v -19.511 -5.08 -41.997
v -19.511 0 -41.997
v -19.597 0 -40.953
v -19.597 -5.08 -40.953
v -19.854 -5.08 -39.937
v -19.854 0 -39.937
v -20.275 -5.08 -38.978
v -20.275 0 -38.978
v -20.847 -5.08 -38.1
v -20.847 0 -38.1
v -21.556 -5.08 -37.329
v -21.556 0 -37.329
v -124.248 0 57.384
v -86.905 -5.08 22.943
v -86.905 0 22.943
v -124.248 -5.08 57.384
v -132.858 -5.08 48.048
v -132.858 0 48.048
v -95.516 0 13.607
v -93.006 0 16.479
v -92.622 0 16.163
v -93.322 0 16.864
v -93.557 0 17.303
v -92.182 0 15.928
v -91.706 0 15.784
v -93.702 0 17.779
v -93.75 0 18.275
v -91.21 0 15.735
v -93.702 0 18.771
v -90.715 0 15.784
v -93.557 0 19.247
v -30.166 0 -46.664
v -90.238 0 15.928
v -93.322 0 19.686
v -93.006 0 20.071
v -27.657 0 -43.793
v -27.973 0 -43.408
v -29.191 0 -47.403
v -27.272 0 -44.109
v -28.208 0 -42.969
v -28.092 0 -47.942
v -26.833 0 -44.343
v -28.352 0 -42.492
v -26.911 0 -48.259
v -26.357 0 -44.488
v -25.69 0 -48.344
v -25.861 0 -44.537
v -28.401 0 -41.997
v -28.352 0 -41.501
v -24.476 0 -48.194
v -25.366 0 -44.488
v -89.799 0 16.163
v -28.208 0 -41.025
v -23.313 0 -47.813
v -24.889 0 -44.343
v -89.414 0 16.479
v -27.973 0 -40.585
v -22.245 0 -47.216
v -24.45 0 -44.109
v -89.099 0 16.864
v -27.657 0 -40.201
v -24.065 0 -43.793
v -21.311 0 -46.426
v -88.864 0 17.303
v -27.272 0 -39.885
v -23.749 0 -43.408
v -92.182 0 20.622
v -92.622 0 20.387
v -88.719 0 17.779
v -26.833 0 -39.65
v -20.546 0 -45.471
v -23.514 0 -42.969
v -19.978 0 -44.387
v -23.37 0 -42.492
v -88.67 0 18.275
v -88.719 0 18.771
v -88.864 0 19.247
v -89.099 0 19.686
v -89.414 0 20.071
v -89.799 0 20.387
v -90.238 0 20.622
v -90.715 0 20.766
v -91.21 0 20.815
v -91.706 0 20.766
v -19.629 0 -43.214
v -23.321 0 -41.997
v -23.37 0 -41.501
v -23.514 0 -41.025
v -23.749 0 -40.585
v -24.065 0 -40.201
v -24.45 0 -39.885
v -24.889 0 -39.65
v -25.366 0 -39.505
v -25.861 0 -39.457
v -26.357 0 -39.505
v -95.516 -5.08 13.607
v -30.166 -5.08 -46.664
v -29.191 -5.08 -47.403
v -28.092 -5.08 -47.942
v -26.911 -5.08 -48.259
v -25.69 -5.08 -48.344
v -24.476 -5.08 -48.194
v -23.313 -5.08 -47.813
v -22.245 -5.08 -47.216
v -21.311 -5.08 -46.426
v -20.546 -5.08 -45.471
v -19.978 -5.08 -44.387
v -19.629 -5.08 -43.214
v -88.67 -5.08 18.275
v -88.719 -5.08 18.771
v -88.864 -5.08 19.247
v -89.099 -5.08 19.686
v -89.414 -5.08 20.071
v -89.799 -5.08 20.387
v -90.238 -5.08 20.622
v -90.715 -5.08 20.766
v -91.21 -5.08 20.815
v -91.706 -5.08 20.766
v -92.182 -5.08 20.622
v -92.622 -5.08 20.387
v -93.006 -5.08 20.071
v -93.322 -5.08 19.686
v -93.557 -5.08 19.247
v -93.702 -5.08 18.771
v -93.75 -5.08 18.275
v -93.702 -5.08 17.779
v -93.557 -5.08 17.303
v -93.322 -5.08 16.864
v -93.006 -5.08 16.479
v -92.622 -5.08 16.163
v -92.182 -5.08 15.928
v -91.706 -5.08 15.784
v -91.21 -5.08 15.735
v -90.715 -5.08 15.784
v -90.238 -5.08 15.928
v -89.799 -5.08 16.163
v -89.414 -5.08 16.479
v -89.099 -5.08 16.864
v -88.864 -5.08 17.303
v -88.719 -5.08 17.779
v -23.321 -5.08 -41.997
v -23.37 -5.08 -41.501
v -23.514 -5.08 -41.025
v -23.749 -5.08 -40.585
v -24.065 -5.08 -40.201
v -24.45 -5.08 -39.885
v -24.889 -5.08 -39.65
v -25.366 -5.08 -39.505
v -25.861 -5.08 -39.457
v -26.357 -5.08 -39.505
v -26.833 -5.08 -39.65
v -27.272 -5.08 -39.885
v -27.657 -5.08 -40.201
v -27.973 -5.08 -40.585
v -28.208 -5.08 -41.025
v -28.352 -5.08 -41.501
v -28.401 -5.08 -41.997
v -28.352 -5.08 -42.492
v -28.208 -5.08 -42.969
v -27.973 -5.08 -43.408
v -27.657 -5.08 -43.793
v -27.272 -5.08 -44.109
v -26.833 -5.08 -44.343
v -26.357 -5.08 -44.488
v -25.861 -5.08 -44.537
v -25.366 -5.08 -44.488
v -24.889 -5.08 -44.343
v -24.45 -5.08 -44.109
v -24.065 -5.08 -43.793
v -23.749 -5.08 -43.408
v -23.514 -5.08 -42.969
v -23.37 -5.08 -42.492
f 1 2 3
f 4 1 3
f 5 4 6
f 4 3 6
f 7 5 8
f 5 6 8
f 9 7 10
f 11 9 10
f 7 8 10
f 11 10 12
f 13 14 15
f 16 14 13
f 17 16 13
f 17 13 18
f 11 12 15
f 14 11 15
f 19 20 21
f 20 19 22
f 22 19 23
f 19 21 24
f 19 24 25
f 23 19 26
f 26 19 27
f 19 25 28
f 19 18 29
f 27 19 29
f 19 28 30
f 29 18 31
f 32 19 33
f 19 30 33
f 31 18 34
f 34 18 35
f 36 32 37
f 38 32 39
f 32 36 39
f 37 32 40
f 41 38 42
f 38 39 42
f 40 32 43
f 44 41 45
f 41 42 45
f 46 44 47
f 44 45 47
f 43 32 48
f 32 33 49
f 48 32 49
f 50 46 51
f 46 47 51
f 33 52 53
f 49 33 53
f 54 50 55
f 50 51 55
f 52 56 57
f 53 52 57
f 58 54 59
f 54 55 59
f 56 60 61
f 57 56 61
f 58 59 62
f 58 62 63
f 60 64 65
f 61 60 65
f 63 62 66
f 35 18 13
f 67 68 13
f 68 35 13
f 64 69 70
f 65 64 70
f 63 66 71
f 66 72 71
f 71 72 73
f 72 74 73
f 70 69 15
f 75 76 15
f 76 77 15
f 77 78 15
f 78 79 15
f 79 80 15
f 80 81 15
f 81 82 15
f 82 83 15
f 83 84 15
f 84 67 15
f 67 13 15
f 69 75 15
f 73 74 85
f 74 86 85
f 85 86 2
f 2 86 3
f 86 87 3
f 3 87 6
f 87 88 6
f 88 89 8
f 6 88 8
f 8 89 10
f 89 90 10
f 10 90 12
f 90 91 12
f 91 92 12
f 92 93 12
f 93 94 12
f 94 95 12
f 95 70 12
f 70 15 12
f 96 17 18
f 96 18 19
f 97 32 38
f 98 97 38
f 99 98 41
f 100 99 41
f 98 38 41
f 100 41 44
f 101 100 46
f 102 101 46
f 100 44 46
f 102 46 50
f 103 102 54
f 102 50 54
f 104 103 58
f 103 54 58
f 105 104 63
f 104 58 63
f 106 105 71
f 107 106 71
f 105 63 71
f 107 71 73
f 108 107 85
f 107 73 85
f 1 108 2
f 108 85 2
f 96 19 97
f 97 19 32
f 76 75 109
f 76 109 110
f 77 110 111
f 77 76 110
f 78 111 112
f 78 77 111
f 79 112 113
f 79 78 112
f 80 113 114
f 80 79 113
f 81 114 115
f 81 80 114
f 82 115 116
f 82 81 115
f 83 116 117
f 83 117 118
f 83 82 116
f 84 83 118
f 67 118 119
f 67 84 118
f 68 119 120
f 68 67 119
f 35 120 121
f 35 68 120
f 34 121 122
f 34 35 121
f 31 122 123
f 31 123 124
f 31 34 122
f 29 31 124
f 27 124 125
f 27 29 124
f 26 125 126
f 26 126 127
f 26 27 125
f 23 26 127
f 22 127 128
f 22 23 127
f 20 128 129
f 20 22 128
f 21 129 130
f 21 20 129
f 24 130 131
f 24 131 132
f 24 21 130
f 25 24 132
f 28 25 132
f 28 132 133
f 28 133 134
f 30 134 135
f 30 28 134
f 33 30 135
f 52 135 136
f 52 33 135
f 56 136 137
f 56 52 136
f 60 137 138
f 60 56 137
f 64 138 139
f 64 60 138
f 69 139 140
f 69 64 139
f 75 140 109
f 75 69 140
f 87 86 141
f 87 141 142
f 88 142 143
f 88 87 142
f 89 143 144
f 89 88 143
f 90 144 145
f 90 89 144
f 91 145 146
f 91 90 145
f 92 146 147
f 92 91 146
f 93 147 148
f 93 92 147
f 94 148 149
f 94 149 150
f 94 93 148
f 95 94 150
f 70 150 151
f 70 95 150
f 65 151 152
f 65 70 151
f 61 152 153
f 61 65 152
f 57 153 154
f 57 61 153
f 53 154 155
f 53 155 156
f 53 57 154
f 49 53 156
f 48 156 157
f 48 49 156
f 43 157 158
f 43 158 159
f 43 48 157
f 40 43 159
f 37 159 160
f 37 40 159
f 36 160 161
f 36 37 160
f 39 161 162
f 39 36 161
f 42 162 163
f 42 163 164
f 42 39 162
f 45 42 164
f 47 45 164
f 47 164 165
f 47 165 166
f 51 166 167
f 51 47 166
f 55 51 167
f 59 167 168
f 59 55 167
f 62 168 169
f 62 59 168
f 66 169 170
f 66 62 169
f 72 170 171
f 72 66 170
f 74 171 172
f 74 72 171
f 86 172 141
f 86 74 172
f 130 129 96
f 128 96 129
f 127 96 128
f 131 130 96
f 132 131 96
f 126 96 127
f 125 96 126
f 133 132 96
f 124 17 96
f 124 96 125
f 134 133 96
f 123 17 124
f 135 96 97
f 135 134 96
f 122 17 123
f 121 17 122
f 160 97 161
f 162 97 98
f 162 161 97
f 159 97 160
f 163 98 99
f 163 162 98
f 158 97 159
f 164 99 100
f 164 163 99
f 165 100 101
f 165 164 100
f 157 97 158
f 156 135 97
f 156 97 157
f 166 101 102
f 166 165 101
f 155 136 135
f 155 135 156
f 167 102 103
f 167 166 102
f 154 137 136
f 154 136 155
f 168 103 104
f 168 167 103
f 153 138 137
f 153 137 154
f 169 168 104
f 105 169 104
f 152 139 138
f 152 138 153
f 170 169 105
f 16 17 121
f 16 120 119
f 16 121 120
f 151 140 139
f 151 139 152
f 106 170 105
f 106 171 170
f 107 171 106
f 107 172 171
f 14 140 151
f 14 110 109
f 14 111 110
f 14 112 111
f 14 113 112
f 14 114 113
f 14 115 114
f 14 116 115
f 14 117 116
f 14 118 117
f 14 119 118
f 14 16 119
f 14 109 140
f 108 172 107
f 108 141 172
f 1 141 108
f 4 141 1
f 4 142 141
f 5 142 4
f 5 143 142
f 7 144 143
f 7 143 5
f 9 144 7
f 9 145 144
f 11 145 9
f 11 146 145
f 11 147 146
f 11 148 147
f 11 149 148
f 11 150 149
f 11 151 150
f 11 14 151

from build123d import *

# Parameters (mm, degrees)
F0_R     = 2.54
F1_DEPTH = 5.08
F3_DEPTH = 5.08


with BuildPart() as f1:
    # F0 (on Front) → F1 (new body)
    with BuildSketch(Plane.XZ):
        with BuildLine():
            ThreePointArc((-30.166206, -46.664449), (-23.31305, -47.812995), (-19.511088, -41.996638))
            ThreePointArc((-19.511088, -41.996638), (-20.044732, -39.4486), (-21.55597, -37.328828))
            ThreePointArc((-21.55597, -37.328828), (-30.528899, -37.69152), (-30.166206, -46.664449))
        make_face()
        with Locations((-25.861088, -41.996638)):
            Circle(F0_R, mode=Mode.SUBTRACT)
        with BuildLine():
            ThreePointArc((-30.166206, -46.664449), (-30.528899, -37.69152), (-21.55597, -37.328828))
            Line((-21.55597, -37.328828), (-86.90532, 22.942827))
            ThreePointArc((-86.90532, 22.942827), (-85.394082, 20.823055), (-84.860439, 18.275017))
            ThreePointArc((-84.860439, 18.275017), (-88.6624, 12.45866), (-95.515557, 13.607206))
            Line((-95.515557, 13.607206), (-30.166206, -46.664449))
        make_face()
        with BuildLine():
            ThreePointArc((-84.860439, 18.275017), (-85.394082, 20.823055), (-86.90532, 22.942827))
            ThreePointArc((-86.90532, 22.942827), (-95.878249, 22.580135), (-95.515557, 13.607206))
            ThreePointArc((-95.515557, 13.607206), (-88.6624, 12.45866), (-84.860439, 18.275017))
        make_face()
        with Locations((-91.210439, 18.275017)):
            Circle(F0_R, mode=Mode.SUBTRACT)
    extrude(amount=F1_DEPTH)

    # F2 (on face) → F3 (join)
    with BuildSketch(Plane.XZ.offset(5.08)):
        with BuildLine():
            ThreePointArc((-95.515557, 13.607206), (-95.878249, 22.580135), (-86.90532, 22.942827))
            Line((-86.90532, 22.942827), (-124.247806, 57.383773))
            Line((-124.247806, 57.383773), (-132.858043, 48.048152))
            Line((-132.858043, 48.048152), (-95.515557, 13.607206))
        make_face()
    extrude(amount=-F3_DEPTH)


solid = f1.part
